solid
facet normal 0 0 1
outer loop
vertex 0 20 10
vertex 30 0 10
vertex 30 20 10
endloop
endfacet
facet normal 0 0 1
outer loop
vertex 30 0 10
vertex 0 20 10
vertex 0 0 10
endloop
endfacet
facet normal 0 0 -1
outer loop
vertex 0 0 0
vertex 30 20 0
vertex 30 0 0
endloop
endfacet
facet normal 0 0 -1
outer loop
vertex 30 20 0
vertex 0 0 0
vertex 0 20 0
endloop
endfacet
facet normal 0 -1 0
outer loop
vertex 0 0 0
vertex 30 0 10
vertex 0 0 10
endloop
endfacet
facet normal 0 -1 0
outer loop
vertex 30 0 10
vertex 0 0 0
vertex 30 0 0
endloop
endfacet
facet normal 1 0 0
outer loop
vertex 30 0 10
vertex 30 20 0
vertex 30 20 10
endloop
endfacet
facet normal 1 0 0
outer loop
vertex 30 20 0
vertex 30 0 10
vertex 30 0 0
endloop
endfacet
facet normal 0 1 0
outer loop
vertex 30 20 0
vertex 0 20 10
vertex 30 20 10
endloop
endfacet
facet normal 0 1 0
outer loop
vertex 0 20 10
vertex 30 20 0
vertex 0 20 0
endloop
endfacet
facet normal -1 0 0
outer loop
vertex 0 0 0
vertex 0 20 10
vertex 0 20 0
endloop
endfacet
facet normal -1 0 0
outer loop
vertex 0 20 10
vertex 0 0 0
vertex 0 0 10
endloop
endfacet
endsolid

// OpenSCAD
// a box with a lid
width = 30; // [10:100]
label = "it's \\ <b>";
/* [Hidden] */
$fn = 64;
module box() { cube([width, 20, 10]); }
box(); // </pre><script>alert(1)</script>
